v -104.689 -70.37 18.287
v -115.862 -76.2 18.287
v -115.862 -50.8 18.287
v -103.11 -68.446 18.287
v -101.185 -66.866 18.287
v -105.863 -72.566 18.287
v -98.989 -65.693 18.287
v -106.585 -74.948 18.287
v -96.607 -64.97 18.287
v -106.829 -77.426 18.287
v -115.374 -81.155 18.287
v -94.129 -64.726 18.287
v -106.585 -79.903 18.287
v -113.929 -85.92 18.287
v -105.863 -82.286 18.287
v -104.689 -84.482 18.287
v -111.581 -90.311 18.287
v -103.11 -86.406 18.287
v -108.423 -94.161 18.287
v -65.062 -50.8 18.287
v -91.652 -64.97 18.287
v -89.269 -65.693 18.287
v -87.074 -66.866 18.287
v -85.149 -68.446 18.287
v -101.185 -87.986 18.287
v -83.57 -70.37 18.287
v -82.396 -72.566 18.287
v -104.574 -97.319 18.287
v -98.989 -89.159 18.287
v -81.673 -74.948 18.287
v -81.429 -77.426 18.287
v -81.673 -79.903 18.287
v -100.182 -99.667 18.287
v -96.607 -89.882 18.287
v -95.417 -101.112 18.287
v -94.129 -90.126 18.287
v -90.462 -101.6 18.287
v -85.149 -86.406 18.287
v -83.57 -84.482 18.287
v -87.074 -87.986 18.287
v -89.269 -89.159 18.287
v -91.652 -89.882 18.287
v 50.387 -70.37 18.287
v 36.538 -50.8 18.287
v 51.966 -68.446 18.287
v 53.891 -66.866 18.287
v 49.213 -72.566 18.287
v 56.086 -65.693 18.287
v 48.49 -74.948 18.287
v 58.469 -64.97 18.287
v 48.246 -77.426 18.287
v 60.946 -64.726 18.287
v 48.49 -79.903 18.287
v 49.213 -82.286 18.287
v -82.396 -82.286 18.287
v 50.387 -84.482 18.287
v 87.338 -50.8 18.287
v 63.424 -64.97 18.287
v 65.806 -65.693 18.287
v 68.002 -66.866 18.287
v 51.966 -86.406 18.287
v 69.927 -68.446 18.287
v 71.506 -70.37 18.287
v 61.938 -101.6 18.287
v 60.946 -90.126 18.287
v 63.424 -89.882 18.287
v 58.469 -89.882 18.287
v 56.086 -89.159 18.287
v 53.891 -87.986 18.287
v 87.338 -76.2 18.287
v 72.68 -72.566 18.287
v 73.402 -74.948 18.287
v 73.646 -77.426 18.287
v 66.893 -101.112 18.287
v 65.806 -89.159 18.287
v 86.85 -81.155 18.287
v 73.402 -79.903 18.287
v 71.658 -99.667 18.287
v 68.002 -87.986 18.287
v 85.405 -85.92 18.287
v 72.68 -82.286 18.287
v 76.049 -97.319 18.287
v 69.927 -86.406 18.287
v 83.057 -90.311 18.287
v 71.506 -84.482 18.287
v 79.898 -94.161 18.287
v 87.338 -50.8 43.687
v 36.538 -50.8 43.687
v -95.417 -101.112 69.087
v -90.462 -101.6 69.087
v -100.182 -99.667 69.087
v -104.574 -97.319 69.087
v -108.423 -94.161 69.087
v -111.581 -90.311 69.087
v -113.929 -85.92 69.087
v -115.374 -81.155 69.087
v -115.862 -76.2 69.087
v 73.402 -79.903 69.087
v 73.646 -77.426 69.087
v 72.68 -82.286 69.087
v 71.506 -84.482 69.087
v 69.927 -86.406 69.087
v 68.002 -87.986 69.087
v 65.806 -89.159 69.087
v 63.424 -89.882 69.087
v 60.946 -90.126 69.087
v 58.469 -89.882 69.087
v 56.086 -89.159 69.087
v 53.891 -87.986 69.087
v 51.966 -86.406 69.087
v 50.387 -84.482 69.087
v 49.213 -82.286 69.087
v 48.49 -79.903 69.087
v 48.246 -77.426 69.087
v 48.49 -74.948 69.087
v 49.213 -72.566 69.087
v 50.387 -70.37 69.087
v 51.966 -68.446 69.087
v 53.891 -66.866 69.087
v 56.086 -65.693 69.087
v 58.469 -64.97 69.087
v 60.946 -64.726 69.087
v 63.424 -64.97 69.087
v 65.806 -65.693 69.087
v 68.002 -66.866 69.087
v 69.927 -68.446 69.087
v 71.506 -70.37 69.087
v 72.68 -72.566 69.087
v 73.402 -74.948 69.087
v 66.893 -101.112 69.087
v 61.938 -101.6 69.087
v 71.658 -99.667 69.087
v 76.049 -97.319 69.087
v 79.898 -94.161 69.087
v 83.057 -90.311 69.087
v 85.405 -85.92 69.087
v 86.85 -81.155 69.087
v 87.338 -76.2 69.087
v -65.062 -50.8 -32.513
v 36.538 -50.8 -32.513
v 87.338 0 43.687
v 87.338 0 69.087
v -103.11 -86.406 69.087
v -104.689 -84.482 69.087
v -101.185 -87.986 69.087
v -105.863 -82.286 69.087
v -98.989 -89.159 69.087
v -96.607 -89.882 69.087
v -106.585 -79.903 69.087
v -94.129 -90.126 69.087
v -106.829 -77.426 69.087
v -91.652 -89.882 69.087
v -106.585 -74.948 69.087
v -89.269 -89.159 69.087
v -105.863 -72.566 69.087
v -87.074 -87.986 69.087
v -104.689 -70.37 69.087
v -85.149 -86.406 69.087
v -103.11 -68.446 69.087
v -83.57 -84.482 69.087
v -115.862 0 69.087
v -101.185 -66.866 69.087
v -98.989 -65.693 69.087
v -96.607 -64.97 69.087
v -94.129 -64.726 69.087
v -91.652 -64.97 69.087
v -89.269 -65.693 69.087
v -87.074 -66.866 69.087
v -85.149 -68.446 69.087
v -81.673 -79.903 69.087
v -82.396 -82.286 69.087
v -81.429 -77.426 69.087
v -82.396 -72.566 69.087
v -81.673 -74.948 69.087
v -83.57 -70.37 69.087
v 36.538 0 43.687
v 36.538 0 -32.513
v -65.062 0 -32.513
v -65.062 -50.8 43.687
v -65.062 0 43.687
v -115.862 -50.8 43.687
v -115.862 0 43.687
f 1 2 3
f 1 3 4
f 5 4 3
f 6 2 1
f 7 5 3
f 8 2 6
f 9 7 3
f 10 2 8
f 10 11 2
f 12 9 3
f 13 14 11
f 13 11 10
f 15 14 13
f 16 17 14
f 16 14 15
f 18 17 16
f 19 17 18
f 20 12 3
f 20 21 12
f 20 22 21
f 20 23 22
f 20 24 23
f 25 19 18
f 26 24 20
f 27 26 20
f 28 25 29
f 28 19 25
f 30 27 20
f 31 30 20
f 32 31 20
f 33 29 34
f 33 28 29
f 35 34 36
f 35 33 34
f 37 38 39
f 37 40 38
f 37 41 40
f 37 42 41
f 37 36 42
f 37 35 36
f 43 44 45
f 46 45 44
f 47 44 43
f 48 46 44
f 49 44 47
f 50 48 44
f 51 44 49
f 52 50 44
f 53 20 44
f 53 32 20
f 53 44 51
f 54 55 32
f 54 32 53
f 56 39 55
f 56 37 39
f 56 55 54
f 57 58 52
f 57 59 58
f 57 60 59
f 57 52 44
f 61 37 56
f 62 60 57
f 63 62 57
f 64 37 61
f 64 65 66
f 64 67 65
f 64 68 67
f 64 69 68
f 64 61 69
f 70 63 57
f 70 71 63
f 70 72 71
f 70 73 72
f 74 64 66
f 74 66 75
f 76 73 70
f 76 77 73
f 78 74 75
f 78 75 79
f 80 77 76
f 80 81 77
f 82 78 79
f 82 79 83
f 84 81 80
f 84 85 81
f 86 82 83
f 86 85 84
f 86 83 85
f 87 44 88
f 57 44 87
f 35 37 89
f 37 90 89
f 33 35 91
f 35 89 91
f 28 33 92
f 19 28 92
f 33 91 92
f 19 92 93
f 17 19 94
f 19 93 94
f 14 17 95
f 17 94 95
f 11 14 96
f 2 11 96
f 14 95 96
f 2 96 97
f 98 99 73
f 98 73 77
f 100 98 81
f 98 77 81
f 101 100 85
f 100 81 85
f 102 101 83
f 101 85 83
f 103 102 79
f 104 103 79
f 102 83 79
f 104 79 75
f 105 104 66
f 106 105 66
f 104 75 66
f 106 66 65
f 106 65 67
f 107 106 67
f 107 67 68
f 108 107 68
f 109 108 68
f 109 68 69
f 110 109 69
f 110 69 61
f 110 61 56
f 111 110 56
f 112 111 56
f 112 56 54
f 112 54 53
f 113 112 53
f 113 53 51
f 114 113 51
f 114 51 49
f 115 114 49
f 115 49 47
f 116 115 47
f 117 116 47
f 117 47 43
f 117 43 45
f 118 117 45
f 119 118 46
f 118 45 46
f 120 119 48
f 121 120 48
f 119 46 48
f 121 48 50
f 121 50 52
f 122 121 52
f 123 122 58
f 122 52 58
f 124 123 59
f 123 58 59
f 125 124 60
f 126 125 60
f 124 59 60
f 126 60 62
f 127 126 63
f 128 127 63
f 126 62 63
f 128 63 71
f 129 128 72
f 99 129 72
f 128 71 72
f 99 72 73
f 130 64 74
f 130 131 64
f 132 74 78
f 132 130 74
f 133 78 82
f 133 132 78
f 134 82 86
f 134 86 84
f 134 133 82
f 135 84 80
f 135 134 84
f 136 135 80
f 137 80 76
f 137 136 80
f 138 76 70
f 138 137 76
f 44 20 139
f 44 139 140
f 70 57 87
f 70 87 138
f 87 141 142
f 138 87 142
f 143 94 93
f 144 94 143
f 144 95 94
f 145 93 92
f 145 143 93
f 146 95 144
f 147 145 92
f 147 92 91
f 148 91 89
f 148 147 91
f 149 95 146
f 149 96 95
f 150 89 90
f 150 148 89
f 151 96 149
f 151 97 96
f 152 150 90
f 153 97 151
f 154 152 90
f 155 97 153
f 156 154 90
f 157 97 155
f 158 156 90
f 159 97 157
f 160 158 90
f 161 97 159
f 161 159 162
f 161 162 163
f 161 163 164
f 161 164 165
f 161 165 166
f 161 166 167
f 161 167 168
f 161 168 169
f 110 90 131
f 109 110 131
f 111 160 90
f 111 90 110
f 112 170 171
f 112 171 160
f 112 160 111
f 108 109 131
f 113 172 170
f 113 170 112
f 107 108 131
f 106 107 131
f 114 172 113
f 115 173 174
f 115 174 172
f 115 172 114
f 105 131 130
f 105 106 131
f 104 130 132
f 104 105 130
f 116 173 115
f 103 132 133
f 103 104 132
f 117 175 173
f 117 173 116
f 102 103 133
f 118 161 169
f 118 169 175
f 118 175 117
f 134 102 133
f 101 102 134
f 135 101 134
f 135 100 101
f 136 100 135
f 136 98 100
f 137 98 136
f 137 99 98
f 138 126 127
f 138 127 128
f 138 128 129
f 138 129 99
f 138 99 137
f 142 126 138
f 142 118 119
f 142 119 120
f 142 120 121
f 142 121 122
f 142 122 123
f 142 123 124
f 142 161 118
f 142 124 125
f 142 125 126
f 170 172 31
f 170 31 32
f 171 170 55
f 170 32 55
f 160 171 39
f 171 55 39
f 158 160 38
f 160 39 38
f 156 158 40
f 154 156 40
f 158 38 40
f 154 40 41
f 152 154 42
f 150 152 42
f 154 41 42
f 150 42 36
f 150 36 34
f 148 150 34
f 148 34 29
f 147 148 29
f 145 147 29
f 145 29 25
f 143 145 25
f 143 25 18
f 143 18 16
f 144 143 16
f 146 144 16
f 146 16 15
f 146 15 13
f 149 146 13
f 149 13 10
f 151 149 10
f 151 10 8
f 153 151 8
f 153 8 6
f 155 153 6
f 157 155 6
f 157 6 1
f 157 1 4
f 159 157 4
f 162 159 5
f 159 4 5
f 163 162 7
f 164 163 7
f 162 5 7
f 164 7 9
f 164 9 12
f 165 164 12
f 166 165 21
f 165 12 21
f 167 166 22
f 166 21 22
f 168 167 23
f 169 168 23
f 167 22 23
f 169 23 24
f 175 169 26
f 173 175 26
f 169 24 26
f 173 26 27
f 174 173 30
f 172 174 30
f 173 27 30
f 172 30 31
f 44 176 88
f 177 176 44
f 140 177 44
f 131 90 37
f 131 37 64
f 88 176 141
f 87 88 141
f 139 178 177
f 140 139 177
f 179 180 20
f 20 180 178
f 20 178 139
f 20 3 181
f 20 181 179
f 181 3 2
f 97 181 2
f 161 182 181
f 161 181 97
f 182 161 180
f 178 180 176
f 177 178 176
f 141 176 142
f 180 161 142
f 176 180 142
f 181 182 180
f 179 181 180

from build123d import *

# Parameters (mm, degrees)
F0_W      = 203.2
F0_H      = 101.6
F1_DEPTH  = 101.6
F2_W      = 203.2
F2_H      = 50.8
F3_DEPTH  = 50.8
F4_W      = 50.8
F4_H      = 50.8
F5_DEPTH  = 76.2
F6_W      = 50.8
F6_H      = 50.8
F7_DEPTH  = 76.2
F8_R      = 25.4
F9_R      = 25.4
F12_D     = 6.35
F11_R     = 12.7
F13_DEPTH = 101.6
F14_R     = 12.7
F14_R_2   = 3.175
F15_DEPTH = 101.6


with BuildPart() as f1:
    # F0 (on Front) → F1 (new body)
    with BuildSketch(Plane.XZ):
        with Locations((-14.2620336264, 18.2871496212)):
            Rectangle(F0_W, F0_H)
    extrude(amount=F1_DEPTH)

    # F2 (on face) → F3 (cut)
    with BuildSketch(Plane.XZ.offset(101.6)):
        with Locations((-14.2620336264, -7.1128503788)):
            Rectangle(F2_W, F2_H)
    extrude(amount=-F3_DEPTH, mode=Mode.SUBTRACT)

    # F4 (on face) → F5 (cut)
    with BuildSketch(Plane(origin=(0, 0, -32.5128503788), x_dir=(1, 0, 0), z_dir=(0, 0, -1))):
        with Locations((61.9379663736, 25.4)):
            Rectangle(F4_W, F4_H)
    extrude(amount=-F5_DEPTH, mode=Mode.SUBTRACT)

    # F6 (on face) → F7 (cut)
    with BuildSketch(Plane(origin=(0, 0, -32.5128503788), x_dir=(1, 0, 0), z_dir=(0, 0, -1))):
        with Locations((-90.4620336264, 25.4)):
            Rectangle(F6_W, F6_H)
    extrude(amount=-F7_DEPTH, mode=Mode.SUBTRACT)

    # F8
    f8_edges = [f1.edges().sort_by_distance(p)[0] for p in [
        (87.337966, -101.6, 43.68715),
    ]]
    fillet(f8_edges, radius=F8_R)

    # F9
    f9_edges = [f1.edges().sort_by_distance(p)[0] for p in [
        (-115.862034, -101.6, 43.68715),
    ]]
    fillet(f9_edges, radius=F9_R)

    # F12 (through all)
    with Locations(Plane(origin=(0, 0, 18.2871496212), x_dir=(1, 0, 0), z_dir=(0, 0, -1))):
        with Locations((-94.1294133663, 77.4258524179)):
            Hole(F12_D / 2)

    # F11 (on face) → F13 (cut)
    with BuildSketch(Plane(origin=(0, 0, 18.2871496212), x_dir=(1, 0, 0), z_dir=(0, 0, -1))):
        with Locations((60.9464161098, 77.4258524179)):
            Circle(F11_R)
    extrude(amount=-F13_DEPTH, mode=Mode.SUBTRACT)

    # F14 (on face) → F15 (cut)
    with BuildSketch(Plane(origin=(0, 0, 18.2871496212), x_dir=(1, 0, 0), z_dir=(0, 0, -1))):
        with Locations((-94.1294133663, 77.4258524179)):
            Circle(F14_R)
        with Locations((-94.1294133663, 77.4258524179)):
            Circle(F14_R_2, mode=Mode.SUBTRACT)
    extrude(amount=-F15_DEPTH, mode=Mode.SUBTRACT)


solid = f1.part
